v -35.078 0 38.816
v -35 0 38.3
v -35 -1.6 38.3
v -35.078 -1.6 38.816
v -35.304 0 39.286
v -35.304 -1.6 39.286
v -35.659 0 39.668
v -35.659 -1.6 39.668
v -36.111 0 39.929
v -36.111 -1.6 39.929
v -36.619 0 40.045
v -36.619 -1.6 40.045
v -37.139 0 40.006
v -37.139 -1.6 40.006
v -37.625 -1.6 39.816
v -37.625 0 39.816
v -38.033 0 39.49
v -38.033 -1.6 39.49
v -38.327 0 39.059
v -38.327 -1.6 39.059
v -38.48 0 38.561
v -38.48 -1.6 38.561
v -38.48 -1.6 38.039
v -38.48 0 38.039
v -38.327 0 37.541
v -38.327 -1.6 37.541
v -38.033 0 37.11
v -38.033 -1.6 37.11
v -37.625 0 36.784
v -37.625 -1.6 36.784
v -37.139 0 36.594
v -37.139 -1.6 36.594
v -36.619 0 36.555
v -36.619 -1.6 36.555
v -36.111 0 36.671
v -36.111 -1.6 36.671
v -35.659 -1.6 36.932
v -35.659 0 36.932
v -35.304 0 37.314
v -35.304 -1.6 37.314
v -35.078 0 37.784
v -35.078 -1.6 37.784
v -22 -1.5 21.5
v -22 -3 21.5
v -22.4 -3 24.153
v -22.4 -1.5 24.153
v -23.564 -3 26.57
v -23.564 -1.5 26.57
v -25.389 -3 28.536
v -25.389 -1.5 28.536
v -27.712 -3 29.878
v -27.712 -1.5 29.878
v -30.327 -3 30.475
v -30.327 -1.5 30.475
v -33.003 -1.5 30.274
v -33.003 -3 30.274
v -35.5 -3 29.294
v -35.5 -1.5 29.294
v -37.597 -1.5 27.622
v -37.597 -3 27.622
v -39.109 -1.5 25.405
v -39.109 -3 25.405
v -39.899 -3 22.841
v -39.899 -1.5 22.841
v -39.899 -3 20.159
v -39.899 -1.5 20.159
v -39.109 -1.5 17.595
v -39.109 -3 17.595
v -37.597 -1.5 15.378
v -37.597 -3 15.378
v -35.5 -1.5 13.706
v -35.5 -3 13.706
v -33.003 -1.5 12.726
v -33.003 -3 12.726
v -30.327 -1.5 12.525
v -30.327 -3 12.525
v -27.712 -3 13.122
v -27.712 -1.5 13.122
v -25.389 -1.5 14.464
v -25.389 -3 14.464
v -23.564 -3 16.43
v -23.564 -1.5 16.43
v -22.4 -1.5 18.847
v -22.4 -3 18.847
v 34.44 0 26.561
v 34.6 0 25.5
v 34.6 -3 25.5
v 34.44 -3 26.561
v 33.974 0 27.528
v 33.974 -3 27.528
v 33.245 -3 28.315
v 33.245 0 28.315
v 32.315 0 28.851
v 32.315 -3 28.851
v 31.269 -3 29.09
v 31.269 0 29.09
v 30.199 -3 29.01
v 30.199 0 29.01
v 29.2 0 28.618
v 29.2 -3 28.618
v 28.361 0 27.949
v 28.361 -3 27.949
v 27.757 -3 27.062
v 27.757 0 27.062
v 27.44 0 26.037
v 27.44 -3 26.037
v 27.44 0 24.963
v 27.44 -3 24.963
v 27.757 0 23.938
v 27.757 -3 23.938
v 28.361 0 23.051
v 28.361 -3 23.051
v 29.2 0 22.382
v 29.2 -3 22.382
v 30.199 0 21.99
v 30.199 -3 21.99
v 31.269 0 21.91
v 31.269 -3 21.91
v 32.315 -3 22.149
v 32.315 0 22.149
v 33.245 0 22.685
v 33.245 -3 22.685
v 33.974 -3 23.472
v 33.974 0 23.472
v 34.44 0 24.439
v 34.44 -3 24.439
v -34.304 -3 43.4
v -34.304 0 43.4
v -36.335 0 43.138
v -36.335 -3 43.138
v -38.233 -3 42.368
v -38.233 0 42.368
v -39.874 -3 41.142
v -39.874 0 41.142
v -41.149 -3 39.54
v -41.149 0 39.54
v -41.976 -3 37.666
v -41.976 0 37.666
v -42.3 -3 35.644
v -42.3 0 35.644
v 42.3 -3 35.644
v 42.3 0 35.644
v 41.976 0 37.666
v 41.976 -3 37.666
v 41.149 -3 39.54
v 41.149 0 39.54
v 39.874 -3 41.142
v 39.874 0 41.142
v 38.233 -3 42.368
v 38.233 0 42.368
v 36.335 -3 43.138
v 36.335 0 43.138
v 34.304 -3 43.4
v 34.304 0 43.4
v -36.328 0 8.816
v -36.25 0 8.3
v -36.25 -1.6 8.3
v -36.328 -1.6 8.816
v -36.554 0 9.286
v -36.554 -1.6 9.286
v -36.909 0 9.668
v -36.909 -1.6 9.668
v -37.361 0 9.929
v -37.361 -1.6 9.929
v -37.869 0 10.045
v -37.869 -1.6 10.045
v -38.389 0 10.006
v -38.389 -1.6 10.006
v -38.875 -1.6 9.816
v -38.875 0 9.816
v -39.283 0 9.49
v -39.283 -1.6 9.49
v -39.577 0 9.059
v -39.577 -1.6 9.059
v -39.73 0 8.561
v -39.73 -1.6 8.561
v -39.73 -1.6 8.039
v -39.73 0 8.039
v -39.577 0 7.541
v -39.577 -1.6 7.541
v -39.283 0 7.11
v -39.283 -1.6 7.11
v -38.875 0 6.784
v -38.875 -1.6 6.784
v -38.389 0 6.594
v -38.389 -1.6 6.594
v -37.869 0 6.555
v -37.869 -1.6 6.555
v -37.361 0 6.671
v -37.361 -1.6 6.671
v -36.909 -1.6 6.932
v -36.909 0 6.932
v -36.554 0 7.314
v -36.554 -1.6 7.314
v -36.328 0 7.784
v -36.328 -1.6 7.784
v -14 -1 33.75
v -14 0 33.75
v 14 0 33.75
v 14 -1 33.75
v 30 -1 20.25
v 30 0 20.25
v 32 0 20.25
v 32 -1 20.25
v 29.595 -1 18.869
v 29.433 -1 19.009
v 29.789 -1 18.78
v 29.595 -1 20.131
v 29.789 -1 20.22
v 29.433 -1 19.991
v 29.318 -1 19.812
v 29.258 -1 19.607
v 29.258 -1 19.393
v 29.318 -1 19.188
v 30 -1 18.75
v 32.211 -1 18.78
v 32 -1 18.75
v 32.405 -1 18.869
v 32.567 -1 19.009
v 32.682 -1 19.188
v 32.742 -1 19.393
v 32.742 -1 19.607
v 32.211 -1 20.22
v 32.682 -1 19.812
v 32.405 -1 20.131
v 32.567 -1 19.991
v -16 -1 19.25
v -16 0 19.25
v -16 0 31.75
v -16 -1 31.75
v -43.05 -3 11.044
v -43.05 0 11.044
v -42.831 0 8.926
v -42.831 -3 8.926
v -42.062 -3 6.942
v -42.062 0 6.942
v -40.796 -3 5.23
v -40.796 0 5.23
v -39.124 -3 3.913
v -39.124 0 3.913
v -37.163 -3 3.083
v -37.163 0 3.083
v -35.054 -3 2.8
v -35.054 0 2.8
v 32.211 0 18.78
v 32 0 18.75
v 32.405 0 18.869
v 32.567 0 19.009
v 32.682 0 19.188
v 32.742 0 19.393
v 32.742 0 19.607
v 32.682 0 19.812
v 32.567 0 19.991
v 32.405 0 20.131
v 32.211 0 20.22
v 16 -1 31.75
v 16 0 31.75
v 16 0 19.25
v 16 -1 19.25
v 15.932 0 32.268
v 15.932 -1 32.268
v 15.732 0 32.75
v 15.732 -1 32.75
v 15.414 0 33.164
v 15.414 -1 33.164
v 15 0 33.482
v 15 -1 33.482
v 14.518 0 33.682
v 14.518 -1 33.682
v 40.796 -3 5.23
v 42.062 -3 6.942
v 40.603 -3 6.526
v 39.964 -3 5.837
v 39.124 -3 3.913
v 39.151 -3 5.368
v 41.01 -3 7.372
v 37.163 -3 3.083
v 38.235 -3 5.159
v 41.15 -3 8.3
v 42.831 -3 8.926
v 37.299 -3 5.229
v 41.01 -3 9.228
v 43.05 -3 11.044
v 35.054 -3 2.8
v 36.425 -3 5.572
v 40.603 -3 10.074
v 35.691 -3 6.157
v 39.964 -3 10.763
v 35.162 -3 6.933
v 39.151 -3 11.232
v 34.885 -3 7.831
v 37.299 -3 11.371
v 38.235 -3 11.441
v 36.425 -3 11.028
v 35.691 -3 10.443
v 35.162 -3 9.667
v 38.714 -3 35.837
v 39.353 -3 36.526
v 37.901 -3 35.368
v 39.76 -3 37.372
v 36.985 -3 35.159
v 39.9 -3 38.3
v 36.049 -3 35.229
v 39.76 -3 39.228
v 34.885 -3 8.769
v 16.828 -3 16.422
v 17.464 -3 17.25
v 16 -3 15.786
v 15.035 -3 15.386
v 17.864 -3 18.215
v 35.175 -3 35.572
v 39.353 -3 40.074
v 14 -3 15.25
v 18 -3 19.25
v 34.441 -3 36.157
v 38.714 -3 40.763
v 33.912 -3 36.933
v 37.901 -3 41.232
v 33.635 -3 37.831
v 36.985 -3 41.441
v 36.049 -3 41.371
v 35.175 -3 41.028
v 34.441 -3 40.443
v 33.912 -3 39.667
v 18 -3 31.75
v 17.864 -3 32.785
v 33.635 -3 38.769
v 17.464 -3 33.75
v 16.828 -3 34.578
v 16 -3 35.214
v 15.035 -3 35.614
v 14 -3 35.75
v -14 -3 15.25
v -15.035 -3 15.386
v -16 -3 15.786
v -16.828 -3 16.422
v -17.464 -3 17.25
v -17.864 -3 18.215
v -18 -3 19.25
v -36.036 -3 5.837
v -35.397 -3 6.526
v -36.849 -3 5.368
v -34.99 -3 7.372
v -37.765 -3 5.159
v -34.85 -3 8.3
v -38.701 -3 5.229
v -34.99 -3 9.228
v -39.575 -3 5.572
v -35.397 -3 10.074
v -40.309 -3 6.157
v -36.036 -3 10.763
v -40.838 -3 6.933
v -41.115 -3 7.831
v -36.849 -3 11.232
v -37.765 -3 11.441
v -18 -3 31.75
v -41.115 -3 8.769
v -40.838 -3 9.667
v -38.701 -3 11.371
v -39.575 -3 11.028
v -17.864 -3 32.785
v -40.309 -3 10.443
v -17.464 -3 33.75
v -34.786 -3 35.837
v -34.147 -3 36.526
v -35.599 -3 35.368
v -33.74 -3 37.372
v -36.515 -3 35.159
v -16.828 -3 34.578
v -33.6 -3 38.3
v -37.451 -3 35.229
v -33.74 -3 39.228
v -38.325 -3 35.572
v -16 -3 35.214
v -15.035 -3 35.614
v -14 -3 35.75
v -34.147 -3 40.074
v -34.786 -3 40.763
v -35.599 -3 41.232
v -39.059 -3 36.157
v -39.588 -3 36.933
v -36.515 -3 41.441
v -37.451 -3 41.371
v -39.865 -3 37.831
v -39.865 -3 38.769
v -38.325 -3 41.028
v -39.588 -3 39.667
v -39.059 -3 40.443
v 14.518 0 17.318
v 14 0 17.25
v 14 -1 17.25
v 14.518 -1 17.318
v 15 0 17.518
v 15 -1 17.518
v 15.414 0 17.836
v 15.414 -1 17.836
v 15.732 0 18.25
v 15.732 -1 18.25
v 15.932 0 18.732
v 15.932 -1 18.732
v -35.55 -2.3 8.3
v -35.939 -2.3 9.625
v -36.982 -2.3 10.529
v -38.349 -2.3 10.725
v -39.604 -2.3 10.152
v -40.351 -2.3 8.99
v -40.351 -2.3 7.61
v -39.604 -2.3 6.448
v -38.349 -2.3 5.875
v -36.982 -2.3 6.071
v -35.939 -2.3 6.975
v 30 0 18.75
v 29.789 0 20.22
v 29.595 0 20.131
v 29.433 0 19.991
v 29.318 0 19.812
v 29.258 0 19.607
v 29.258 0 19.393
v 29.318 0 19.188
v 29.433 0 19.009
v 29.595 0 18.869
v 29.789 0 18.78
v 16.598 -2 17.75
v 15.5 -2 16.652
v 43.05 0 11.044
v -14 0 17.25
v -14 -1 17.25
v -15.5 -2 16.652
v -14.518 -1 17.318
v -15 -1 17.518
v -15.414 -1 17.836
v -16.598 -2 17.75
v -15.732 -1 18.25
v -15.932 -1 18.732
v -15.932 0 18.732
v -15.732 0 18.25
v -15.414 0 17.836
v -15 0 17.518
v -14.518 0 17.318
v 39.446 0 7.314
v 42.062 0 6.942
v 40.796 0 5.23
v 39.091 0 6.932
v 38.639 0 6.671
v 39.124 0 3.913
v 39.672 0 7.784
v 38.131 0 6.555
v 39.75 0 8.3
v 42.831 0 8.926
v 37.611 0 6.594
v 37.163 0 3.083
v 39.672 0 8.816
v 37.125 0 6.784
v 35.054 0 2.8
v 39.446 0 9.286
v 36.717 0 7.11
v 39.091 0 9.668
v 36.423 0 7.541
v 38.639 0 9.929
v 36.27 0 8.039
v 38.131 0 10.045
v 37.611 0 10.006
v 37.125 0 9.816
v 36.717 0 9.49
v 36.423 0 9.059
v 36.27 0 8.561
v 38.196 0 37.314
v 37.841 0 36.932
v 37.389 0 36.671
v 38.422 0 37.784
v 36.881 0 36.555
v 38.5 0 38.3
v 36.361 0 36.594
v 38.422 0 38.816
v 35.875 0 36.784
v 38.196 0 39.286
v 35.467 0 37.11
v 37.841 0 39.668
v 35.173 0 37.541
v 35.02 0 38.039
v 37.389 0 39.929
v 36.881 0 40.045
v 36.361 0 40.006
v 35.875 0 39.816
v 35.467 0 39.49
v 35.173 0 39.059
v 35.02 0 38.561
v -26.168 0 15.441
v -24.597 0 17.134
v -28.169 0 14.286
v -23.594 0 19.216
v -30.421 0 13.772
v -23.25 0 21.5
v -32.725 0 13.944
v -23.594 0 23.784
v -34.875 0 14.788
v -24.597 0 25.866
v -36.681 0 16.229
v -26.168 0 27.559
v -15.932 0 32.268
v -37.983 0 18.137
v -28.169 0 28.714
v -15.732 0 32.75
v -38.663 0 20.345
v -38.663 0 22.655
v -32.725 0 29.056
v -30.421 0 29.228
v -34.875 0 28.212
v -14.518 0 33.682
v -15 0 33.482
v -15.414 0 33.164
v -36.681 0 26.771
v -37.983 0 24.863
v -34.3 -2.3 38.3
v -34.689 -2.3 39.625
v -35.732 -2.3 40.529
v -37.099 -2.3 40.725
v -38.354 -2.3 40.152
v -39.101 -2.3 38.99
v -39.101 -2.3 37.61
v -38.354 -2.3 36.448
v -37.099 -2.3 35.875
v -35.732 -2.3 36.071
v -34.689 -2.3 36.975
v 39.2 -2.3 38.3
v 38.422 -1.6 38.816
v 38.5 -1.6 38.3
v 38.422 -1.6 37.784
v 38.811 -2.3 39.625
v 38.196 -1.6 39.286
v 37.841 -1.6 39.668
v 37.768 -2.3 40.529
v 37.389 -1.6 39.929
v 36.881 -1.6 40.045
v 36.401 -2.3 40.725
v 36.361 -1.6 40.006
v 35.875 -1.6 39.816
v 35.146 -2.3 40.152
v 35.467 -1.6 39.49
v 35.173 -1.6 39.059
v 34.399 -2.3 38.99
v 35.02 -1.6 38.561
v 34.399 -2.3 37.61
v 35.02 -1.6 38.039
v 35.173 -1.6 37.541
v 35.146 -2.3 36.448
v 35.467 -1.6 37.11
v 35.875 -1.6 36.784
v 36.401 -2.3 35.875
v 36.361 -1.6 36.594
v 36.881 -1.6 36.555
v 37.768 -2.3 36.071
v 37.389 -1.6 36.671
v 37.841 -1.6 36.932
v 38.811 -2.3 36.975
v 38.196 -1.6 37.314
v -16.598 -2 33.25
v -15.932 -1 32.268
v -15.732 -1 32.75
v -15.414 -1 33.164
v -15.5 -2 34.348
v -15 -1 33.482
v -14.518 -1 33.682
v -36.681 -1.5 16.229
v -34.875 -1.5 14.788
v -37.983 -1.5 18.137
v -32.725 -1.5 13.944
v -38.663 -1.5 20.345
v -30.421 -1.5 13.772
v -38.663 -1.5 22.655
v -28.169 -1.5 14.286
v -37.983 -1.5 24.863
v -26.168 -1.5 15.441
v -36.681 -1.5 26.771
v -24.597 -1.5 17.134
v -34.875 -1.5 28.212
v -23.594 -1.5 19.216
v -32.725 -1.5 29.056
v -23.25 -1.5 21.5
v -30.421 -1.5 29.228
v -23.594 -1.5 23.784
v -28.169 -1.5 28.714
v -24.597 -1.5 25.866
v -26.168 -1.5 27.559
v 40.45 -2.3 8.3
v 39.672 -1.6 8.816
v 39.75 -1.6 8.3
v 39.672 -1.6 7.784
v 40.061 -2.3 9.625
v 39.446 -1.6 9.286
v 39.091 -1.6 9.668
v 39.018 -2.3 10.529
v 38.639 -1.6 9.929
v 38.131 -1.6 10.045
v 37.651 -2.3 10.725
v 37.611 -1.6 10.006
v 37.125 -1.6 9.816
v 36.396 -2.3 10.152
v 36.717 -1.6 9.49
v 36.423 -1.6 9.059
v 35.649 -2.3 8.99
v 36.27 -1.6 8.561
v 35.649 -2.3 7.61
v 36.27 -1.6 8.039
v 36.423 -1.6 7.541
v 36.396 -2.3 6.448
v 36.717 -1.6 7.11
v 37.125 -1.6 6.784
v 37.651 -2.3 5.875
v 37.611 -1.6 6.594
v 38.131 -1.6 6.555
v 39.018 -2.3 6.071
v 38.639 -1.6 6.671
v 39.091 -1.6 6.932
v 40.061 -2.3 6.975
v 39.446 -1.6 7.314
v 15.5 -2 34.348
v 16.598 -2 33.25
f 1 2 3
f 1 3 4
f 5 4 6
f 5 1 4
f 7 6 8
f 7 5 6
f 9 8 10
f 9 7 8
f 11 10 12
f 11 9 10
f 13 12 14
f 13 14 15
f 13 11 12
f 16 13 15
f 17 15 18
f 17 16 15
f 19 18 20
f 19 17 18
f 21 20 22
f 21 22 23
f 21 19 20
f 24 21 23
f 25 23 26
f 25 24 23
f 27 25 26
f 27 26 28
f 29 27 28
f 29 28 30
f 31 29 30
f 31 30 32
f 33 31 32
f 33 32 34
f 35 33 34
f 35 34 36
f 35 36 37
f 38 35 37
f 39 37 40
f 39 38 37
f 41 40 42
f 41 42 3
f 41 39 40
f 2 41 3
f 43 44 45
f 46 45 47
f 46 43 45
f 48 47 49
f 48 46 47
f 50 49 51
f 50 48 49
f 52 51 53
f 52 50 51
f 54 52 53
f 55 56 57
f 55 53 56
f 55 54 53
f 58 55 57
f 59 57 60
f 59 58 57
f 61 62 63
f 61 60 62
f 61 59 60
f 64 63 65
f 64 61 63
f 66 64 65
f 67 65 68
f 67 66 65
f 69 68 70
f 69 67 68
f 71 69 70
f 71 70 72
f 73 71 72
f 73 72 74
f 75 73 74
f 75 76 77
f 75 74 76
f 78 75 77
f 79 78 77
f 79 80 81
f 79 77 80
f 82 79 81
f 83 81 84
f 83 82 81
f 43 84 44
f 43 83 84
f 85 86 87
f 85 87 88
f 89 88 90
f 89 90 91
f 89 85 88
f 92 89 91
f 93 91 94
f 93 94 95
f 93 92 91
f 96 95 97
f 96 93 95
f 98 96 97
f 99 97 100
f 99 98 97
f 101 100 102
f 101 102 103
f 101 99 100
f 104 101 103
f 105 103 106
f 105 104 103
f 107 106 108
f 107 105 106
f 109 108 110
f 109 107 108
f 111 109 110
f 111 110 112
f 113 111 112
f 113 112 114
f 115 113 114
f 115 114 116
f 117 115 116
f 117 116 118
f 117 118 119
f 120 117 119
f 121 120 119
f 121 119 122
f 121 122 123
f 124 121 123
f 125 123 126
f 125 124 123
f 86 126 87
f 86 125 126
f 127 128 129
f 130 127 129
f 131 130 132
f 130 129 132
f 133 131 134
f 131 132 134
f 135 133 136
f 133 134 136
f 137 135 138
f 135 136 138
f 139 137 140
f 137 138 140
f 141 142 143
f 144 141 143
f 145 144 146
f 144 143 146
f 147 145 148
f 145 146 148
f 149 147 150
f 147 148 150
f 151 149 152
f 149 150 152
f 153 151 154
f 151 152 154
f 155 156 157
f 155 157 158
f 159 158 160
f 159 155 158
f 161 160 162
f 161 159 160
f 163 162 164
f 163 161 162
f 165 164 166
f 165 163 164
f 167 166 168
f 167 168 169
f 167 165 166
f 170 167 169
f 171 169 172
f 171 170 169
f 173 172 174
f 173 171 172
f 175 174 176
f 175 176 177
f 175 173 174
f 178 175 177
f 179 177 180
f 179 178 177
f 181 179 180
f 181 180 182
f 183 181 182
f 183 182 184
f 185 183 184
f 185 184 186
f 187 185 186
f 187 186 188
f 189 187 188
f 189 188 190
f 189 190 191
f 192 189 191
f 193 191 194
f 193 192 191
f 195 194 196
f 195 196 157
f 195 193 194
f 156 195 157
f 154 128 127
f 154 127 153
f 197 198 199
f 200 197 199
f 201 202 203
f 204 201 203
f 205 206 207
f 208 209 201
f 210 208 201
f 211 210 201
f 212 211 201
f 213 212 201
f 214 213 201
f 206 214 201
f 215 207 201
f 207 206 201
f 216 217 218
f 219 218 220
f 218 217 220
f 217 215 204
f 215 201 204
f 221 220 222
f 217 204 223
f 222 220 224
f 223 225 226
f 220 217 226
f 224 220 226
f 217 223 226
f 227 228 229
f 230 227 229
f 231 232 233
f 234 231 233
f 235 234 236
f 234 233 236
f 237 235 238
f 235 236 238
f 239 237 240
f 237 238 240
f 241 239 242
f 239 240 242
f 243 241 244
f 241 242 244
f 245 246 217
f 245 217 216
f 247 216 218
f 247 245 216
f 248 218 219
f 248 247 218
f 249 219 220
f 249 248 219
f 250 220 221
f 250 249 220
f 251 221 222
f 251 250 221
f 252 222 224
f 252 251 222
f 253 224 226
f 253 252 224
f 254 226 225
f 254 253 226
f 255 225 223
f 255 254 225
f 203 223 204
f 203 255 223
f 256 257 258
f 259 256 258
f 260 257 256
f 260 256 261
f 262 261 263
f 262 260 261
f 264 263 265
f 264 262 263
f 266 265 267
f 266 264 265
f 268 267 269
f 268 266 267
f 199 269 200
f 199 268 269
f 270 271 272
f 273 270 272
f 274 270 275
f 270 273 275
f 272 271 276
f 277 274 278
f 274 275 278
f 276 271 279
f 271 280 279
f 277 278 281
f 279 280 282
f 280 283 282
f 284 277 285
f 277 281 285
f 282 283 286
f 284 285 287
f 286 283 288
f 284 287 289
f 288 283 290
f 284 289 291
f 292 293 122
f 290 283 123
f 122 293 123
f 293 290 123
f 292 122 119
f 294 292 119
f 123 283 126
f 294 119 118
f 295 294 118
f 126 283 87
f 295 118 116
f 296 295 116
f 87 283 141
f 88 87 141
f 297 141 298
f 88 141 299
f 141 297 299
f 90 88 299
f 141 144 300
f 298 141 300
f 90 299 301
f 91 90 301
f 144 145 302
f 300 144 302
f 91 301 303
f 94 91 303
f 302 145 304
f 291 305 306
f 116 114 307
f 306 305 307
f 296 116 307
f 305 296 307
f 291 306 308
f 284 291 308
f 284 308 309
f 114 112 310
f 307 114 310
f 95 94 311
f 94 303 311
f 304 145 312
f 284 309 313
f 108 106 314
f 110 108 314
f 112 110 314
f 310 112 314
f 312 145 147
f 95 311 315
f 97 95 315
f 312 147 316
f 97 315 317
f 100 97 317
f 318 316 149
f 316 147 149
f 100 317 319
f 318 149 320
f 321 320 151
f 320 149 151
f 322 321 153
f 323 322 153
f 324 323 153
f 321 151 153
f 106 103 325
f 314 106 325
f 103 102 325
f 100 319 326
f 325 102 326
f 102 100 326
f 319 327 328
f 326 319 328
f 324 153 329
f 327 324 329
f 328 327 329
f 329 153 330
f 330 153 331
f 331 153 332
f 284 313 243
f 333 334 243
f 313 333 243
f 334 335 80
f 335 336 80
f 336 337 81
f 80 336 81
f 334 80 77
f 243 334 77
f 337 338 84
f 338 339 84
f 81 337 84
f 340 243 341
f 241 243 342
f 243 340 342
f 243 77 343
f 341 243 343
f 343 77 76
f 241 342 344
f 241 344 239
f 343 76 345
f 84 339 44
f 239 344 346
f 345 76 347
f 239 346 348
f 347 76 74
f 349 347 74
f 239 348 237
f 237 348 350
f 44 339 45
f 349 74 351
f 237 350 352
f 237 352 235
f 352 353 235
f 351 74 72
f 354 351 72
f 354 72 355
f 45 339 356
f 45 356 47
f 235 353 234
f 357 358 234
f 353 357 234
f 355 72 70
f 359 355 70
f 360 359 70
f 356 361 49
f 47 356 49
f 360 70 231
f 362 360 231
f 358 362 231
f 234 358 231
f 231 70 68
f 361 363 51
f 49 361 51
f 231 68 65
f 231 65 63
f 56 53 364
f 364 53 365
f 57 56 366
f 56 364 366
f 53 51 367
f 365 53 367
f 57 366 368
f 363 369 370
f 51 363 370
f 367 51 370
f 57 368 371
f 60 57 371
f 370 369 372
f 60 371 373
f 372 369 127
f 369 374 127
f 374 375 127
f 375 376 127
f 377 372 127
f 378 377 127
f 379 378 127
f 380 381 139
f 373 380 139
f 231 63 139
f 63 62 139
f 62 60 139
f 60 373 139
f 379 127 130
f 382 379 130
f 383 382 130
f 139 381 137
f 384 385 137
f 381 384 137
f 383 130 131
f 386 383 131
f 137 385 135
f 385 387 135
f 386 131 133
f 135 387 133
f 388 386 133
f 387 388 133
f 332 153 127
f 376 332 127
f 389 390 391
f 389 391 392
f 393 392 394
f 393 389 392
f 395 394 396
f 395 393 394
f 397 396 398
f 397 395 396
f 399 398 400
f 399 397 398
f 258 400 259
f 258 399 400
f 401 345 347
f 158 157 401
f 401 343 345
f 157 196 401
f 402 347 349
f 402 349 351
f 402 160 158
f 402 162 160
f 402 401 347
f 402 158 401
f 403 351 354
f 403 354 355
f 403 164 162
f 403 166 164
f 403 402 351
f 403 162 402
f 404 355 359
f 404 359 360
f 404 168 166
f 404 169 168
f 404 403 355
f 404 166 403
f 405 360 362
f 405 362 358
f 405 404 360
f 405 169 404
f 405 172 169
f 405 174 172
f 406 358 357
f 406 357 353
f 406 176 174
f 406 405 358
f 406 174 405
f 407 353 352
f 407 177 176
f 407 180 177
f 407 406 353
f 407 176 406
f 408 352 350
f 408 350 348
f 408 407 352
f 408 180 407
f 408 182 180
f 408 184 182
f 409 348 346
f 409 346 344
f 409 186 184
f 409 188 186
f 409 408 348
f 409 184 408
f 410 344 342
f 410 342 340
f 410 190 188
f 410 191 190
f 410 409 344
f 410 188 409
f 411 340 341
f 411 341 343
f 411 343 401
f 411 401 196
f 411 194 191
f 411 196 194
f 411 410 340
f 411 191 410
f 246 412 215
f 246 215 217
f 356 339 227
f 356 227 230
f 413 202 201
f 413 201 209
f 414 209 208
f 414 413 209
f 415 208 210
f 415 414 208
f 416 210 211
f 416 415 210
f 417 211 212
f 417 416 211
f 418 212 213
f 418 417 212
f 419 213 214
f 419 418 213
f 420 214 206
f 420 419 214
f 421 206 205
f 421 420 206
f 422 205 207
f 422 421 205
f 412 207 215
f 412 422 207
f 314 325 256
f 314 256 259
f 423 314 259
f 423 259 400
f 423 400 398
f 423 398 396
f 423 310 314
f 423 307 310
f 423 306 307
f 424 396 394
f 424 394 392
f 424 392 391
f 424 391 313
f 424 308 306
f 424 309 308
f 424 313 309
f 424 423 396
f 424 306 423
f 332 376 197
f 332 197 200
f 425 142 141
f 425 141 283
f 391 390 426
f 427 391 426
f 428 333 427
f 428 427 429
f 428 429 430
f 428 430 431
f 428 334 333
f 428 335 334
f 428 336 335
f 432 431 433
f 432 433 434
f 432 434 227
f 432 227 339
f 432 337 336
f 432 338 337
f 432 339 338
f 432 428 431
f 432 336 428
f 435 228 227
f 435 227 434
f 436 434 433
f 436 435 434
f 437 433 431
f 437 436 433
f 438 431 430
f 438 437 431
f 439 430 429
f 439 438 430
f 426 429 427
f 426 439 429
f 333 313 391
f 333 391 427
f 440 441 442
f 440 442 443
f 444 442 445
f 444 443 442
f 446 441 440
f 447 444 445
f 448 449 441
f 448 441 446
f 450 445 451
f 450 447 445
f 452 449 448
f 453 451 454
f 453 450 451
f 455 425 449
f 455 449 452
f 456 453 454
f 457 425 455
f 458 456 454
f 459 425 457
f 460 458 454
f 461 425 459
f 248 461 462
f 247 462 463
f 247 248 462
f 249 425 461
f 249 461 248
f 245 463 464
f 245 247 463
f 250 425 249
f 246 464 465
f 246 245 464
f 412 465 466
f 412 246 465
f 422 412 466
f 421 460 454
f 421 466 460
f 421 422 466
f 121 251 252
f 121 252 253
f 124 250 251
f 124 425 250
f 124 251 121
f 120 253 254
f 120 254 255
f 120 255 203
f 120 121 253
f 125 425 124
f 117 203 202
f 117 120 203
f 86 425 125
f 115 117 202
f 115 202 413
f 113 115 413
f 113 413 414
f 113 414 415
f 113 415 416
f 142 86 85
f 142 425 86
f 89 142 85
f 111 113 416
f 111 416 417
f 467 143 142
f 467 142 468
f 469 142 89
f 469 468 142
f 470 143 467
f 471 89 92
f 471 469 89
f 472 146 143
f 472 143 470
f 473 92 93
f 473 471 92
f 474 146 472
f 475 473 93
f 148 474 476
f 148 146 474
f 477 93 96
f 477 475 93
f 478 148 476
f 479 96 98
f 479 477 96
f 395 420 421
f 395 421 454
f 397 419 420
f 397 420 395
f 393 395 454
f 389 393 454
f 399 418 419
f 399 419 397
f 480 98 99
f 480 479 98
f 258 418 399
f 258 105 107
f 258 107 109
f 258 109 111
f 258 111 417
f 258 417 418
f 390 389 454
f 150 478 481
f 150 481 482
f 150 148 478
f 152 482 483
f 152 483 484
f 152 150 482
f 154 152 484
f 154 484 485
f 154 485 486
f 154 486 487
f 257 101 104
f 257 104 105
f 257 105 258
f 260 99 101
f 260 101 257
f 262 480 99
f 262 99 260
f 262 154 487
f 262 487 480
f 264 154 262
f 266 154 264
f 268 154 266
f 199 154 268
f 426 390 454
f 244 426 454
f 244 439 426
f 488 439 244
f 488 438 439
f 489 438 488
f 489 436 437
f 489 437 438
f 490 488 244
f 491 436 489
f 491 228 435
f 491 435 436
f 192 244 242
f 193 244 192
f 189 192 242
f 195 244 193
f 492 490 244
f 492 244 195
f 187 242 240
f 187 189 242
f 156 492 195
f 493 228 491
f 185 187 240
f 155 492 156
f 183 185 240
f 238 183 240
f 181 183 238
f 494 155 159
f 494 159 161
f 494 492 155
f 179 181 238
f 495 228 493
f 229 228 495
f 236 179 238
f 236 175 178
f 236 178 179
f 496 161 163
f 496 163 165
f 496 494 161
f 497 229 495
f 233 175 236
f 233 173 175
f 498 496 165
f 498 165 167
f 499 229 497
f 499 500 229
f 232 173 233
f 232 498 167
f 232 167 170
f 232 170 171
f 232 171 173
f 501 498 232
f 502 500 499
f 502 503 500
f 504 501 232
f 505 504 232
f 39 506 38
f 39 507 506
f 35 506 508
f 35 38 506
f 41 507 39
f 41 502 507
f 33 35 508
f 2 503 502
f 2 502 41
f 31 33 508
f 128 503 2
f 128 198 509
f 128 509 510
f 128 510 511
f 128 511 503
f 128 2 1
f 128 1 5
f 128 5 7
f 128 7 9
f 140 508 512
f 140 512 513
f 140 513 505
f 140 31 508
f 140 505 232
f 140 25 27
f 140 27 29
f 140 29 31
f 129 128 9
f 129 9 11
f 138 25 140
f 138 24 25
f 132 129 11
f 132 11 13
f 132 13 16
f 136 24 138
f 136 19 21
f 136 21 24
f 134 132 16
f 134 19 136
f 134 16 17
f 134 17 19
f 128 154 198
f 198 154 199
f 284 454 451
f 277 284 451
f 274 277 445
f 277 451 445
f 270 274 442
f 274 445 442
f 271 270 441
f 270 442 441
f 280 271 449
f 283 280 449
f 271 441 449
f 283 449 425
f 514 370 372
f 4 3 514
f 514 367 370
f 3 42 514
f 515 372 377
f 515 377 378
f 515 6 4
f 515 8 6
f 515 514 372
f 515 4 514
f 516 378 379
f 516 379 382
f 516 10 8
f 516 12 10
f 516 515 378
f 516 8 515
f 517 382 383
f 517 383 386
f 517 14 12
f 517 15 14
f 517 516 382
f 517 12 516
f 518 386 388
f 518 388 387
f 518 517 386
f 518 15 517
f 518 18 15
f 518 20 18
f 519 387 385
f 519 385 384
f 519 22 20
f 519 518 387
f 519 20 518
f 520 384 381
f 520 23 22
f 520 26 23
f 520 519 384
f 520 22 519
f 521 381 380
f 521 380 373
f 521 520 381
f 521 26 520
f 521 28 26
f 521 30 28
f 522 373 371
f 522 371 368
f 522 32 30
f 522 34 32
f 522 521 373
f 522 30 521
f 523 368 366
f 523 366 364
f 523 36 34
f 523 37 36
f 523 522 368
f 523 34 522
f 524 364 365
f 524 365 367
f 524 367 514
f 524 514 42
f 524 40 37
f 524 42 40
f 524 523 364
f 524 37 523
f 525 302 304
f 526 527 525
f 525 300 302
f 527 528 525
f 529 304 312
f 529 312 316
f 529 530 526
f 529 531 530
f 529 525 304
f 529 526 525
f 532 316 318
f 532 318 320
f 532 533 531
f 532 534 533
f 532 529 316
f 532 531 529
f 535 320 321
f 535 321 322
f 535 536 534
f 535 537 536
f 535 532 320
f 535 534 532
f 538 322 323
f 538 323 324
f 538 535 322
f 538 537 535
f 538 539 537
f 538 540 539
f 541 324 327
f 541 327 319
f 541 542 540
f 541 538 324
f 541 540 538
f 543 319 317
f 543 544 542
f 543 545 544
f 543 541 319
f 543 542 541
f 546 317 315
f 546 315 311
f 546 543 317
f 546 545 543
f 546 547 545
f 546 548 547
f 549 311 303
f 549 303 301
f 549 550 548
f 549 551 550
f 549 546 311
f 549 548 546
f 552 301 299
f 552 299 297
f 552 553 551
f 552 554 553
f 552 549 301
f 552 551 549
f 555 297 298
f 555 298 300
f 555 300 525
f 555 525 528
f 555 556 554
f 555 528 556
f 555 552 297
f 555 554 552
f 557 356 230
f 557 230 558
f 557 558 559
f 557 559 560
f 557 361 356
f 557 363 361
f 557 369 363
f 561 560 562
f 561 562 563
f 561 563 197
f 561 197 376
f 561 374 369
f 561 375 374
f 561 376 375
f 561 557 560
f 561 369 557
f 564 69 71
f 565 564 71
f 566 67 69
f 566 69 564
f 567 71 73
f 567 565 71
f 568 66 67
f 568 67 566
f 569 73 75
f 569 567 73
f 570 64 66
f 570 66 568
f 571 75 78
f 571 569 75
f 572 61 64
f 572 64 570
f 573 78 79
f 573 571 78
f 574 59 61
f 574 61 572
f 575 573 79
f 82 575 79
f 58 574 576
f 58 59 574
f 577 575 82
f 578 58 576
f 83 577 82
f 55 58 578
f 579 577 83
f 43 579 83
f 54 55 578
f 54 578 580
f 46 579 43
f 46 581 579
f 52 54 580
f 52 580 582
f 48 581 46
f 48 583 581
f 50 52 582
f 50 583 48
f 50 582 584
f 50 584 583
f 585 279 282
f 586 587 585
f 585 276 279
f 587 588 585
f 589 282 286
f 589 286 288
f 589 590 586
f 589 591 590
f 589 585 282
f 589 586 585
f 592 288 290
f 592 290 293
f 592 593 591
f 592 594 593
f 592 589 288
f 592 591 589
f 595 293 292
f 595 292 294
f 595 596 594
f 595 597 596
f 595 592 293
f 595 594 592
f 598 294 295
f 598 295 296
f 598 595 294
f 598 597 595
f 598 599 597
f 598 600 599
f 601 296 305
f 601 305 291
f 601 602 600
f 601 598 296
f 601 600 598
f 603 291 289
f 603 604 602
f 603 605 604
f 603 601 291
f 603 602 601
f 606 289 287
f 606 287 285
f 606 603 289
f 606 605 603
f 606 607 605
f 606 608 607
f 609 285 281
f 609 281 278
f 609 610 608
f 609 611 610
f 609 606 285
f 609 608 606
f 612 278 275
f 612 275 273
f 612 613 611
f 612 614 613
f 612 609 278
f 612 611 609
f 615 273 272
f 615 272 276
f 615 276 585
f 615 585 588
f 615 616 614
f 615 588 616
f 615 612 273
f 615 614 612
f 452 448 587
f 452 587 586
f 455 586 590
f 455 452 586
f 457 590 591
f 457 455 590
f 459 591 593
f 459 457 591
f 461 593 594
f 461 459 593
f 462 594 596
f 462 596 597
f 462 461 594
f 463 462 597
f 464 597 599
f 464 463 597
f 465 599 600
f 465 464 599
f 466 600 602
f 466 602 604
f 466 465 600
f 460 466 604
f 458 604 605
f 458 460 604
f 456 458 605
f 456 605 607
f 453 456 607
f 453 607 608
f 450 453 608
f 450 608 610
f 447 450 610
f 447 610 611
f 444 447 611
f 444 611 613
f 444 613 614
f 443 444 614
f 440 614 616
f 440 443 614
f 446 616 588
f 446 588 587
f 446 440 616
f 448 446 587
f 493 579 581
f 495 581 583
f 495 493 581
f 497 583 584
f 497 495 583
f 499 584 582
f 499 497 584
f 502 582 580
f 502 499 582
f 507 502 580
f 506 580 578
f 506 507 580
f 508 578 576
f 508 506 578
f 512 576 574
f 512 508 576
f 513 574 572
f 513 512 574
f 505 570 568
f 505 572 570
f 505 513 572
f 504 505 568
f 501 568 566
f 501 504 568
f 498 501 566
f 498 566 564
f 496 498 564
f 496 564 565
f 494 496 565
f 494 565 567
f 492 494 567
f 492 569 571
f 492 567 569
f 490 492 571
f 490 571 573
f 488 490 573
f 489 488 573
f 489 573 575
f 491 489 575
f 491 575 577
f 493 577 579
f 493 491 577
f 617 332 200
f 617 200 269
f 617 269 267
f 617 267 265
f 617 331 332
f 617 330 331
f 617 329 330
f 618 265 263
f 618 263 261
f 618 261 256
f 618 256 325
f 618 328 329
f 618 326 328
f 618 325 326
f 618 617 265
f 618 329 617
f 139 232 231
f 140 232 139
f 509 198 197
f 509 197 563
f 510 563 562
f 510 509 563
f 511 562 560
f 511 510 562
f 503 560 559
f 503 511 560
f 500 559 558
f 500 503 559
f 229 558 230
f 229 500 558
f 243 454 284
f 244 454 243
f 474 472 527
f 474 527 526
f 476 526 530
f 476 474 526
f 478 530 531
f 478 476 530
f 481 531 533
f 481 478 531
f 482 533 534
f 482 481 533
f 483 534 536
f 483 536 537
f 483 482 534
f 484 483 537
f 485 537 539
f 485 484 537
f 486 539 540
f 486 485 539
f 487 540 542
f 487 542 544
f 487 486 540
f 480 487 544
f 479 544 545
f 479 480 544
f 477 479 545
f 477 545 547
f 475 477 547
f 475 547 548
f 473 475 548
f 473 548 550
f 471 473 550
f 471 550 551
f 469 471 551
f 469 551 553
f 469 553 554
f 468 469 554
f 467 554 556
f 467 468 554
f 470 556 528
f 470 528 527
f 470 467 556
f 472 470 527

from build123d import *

# Parameters (mm, degrees)
SKETCH033_R     = 1.75
SKETCH033_R_2   = 7.75
SKETCH033_R_3   = 3.6
PAD001_DEPTH    = 3
CHAMFER001_SIZE = 2
CHAMFER002_SIZE = 1.4
SKETCH035_R     = 9
POCKET008_DEPTH = 1.501
POCKET009_DEPTH = 1


with BuildPart() as part:
    # Sketch033 → Pad001 (new body)
    with BuildSketch(Plane.XZ):
        with BuildLine():
            Line((-34.303718, 43.4), (34.303711, 43.4))
            ThreePointArc((42.299997, 35.643765), (39.873715, 41.142392), (34.303711, 43.4))
            Line((42.299997, 35.643765), (43.05, 11.043791))
            ThreePointArc((35.053716, 2.8), (40.796116, 5.230006), (43.05, 11.043791))
            Line((35.053716, 2.8), (-35.053716, 2.8))
            ThreePointArc((-43.05, 11.043802), (-40.79612, 5.23001), (-35.053716, 2.8))
            Line((-43.05, 11.043802), (-42.300003, 35.643776))
            ThreePointArc((-34.303718, 43.4), (-39.873717, 41.142396), (-42.300003, 35.643776))
        make_face()
        with Locations((-36.75, 38.3)):
            Circle(SKETCH033_R, mode=Mode.SUBTRACT)
        with Locations((36.75, 38.3)):
            Circle(SKETCH033_R, mode=Mode.SUBTRACT)
        with Locations((-38, 8.3)):
            Circle(SKETCH033_R, mode=Mode.SUBTRACT)
        with Locations((38, 8.3)):
            Circle(SKETCH033_R, mode=Mode.SUBTRACT)
        with Locations((-31, 21.5)):
            Circle(SKETCH033_R_2, mode=Mode.SUBTRACT)
        with Locations((31, 25.5)):
            Circle(SKETCH033_R_3, mode=Mode.SUBTRACT)
        with BuildLine():
            Line((-14, 33.75), (14, 33.75))
            ThreePointArc((16, 31.75), (15.414214, 33.164214), (14, 33.75))
            Line((16, 31.75), (16, 19.25))
            ThreePointArc((14, 17.25), (15.414214, 17.835786), (16, 19.25))
            Line((14, 17.25), (-14, 17.25))
            ThreePointArc((-16, 19.25), (-15.414214, 17.835786), (-14, 17.25))
            Line((-16, 19.25), (-16, 31.75))
            ThreePointArc((-14, 33.75), (-15.414214, 33.164214), (-16, 31.75))
        make_face(mode=Mode.SUBTRACT)
    extrude(amount=PAD001_DEPTH)

    # Chamfer001
    chamfer001_edges = [part.edges().sort_by_distance(p)[0] for p in [
        (0, -3, 33.75),
    ]]
    chamfer(chamfer001_edges, length=CHAMFER001_SIZE)

    # Chamfer002
    chamfer002_edges = [part.edges().sort_by_distance(p)[0] for p in [
        (-39.75, -3, 8.3),
        (-38.5, -3, 38.3),
        (36.25, -3, 8.3),
        (35, -3, 38.3),
    ]]
    chamfer(chamfer002_edges, length=CHAMFER002_SIZE)

    # Sketch035 → Pocket008 (cut, through all)
    with BuildSketch(Plane.XZ.offset(1.5)):
        with Locations((-31, 21.5)):
            Circle(SKETCH035_R)
    extrude(amount=POCKET008_DEPTH, mode=Mode.SUBTRACT)

    # Sketch036 → Pocket009 (cut)
    with BuildSketch(Plane.XZ):
        with BuildLine():
            ThreePointArc((30, 20.25), (29.25, 19.5), (30, 18.75))
            Line((30, 18.75), (32, 18.75))
            ThreePointArc((32, 18.75), (32.75, 19.5), (32, 20.25))
            Line((30, 20.25), (32, 20.25))
        make_face()
    extrude(amount=POCKET009_DEPTH, mode=Mode.SUBTRACT)


solid = part.part
